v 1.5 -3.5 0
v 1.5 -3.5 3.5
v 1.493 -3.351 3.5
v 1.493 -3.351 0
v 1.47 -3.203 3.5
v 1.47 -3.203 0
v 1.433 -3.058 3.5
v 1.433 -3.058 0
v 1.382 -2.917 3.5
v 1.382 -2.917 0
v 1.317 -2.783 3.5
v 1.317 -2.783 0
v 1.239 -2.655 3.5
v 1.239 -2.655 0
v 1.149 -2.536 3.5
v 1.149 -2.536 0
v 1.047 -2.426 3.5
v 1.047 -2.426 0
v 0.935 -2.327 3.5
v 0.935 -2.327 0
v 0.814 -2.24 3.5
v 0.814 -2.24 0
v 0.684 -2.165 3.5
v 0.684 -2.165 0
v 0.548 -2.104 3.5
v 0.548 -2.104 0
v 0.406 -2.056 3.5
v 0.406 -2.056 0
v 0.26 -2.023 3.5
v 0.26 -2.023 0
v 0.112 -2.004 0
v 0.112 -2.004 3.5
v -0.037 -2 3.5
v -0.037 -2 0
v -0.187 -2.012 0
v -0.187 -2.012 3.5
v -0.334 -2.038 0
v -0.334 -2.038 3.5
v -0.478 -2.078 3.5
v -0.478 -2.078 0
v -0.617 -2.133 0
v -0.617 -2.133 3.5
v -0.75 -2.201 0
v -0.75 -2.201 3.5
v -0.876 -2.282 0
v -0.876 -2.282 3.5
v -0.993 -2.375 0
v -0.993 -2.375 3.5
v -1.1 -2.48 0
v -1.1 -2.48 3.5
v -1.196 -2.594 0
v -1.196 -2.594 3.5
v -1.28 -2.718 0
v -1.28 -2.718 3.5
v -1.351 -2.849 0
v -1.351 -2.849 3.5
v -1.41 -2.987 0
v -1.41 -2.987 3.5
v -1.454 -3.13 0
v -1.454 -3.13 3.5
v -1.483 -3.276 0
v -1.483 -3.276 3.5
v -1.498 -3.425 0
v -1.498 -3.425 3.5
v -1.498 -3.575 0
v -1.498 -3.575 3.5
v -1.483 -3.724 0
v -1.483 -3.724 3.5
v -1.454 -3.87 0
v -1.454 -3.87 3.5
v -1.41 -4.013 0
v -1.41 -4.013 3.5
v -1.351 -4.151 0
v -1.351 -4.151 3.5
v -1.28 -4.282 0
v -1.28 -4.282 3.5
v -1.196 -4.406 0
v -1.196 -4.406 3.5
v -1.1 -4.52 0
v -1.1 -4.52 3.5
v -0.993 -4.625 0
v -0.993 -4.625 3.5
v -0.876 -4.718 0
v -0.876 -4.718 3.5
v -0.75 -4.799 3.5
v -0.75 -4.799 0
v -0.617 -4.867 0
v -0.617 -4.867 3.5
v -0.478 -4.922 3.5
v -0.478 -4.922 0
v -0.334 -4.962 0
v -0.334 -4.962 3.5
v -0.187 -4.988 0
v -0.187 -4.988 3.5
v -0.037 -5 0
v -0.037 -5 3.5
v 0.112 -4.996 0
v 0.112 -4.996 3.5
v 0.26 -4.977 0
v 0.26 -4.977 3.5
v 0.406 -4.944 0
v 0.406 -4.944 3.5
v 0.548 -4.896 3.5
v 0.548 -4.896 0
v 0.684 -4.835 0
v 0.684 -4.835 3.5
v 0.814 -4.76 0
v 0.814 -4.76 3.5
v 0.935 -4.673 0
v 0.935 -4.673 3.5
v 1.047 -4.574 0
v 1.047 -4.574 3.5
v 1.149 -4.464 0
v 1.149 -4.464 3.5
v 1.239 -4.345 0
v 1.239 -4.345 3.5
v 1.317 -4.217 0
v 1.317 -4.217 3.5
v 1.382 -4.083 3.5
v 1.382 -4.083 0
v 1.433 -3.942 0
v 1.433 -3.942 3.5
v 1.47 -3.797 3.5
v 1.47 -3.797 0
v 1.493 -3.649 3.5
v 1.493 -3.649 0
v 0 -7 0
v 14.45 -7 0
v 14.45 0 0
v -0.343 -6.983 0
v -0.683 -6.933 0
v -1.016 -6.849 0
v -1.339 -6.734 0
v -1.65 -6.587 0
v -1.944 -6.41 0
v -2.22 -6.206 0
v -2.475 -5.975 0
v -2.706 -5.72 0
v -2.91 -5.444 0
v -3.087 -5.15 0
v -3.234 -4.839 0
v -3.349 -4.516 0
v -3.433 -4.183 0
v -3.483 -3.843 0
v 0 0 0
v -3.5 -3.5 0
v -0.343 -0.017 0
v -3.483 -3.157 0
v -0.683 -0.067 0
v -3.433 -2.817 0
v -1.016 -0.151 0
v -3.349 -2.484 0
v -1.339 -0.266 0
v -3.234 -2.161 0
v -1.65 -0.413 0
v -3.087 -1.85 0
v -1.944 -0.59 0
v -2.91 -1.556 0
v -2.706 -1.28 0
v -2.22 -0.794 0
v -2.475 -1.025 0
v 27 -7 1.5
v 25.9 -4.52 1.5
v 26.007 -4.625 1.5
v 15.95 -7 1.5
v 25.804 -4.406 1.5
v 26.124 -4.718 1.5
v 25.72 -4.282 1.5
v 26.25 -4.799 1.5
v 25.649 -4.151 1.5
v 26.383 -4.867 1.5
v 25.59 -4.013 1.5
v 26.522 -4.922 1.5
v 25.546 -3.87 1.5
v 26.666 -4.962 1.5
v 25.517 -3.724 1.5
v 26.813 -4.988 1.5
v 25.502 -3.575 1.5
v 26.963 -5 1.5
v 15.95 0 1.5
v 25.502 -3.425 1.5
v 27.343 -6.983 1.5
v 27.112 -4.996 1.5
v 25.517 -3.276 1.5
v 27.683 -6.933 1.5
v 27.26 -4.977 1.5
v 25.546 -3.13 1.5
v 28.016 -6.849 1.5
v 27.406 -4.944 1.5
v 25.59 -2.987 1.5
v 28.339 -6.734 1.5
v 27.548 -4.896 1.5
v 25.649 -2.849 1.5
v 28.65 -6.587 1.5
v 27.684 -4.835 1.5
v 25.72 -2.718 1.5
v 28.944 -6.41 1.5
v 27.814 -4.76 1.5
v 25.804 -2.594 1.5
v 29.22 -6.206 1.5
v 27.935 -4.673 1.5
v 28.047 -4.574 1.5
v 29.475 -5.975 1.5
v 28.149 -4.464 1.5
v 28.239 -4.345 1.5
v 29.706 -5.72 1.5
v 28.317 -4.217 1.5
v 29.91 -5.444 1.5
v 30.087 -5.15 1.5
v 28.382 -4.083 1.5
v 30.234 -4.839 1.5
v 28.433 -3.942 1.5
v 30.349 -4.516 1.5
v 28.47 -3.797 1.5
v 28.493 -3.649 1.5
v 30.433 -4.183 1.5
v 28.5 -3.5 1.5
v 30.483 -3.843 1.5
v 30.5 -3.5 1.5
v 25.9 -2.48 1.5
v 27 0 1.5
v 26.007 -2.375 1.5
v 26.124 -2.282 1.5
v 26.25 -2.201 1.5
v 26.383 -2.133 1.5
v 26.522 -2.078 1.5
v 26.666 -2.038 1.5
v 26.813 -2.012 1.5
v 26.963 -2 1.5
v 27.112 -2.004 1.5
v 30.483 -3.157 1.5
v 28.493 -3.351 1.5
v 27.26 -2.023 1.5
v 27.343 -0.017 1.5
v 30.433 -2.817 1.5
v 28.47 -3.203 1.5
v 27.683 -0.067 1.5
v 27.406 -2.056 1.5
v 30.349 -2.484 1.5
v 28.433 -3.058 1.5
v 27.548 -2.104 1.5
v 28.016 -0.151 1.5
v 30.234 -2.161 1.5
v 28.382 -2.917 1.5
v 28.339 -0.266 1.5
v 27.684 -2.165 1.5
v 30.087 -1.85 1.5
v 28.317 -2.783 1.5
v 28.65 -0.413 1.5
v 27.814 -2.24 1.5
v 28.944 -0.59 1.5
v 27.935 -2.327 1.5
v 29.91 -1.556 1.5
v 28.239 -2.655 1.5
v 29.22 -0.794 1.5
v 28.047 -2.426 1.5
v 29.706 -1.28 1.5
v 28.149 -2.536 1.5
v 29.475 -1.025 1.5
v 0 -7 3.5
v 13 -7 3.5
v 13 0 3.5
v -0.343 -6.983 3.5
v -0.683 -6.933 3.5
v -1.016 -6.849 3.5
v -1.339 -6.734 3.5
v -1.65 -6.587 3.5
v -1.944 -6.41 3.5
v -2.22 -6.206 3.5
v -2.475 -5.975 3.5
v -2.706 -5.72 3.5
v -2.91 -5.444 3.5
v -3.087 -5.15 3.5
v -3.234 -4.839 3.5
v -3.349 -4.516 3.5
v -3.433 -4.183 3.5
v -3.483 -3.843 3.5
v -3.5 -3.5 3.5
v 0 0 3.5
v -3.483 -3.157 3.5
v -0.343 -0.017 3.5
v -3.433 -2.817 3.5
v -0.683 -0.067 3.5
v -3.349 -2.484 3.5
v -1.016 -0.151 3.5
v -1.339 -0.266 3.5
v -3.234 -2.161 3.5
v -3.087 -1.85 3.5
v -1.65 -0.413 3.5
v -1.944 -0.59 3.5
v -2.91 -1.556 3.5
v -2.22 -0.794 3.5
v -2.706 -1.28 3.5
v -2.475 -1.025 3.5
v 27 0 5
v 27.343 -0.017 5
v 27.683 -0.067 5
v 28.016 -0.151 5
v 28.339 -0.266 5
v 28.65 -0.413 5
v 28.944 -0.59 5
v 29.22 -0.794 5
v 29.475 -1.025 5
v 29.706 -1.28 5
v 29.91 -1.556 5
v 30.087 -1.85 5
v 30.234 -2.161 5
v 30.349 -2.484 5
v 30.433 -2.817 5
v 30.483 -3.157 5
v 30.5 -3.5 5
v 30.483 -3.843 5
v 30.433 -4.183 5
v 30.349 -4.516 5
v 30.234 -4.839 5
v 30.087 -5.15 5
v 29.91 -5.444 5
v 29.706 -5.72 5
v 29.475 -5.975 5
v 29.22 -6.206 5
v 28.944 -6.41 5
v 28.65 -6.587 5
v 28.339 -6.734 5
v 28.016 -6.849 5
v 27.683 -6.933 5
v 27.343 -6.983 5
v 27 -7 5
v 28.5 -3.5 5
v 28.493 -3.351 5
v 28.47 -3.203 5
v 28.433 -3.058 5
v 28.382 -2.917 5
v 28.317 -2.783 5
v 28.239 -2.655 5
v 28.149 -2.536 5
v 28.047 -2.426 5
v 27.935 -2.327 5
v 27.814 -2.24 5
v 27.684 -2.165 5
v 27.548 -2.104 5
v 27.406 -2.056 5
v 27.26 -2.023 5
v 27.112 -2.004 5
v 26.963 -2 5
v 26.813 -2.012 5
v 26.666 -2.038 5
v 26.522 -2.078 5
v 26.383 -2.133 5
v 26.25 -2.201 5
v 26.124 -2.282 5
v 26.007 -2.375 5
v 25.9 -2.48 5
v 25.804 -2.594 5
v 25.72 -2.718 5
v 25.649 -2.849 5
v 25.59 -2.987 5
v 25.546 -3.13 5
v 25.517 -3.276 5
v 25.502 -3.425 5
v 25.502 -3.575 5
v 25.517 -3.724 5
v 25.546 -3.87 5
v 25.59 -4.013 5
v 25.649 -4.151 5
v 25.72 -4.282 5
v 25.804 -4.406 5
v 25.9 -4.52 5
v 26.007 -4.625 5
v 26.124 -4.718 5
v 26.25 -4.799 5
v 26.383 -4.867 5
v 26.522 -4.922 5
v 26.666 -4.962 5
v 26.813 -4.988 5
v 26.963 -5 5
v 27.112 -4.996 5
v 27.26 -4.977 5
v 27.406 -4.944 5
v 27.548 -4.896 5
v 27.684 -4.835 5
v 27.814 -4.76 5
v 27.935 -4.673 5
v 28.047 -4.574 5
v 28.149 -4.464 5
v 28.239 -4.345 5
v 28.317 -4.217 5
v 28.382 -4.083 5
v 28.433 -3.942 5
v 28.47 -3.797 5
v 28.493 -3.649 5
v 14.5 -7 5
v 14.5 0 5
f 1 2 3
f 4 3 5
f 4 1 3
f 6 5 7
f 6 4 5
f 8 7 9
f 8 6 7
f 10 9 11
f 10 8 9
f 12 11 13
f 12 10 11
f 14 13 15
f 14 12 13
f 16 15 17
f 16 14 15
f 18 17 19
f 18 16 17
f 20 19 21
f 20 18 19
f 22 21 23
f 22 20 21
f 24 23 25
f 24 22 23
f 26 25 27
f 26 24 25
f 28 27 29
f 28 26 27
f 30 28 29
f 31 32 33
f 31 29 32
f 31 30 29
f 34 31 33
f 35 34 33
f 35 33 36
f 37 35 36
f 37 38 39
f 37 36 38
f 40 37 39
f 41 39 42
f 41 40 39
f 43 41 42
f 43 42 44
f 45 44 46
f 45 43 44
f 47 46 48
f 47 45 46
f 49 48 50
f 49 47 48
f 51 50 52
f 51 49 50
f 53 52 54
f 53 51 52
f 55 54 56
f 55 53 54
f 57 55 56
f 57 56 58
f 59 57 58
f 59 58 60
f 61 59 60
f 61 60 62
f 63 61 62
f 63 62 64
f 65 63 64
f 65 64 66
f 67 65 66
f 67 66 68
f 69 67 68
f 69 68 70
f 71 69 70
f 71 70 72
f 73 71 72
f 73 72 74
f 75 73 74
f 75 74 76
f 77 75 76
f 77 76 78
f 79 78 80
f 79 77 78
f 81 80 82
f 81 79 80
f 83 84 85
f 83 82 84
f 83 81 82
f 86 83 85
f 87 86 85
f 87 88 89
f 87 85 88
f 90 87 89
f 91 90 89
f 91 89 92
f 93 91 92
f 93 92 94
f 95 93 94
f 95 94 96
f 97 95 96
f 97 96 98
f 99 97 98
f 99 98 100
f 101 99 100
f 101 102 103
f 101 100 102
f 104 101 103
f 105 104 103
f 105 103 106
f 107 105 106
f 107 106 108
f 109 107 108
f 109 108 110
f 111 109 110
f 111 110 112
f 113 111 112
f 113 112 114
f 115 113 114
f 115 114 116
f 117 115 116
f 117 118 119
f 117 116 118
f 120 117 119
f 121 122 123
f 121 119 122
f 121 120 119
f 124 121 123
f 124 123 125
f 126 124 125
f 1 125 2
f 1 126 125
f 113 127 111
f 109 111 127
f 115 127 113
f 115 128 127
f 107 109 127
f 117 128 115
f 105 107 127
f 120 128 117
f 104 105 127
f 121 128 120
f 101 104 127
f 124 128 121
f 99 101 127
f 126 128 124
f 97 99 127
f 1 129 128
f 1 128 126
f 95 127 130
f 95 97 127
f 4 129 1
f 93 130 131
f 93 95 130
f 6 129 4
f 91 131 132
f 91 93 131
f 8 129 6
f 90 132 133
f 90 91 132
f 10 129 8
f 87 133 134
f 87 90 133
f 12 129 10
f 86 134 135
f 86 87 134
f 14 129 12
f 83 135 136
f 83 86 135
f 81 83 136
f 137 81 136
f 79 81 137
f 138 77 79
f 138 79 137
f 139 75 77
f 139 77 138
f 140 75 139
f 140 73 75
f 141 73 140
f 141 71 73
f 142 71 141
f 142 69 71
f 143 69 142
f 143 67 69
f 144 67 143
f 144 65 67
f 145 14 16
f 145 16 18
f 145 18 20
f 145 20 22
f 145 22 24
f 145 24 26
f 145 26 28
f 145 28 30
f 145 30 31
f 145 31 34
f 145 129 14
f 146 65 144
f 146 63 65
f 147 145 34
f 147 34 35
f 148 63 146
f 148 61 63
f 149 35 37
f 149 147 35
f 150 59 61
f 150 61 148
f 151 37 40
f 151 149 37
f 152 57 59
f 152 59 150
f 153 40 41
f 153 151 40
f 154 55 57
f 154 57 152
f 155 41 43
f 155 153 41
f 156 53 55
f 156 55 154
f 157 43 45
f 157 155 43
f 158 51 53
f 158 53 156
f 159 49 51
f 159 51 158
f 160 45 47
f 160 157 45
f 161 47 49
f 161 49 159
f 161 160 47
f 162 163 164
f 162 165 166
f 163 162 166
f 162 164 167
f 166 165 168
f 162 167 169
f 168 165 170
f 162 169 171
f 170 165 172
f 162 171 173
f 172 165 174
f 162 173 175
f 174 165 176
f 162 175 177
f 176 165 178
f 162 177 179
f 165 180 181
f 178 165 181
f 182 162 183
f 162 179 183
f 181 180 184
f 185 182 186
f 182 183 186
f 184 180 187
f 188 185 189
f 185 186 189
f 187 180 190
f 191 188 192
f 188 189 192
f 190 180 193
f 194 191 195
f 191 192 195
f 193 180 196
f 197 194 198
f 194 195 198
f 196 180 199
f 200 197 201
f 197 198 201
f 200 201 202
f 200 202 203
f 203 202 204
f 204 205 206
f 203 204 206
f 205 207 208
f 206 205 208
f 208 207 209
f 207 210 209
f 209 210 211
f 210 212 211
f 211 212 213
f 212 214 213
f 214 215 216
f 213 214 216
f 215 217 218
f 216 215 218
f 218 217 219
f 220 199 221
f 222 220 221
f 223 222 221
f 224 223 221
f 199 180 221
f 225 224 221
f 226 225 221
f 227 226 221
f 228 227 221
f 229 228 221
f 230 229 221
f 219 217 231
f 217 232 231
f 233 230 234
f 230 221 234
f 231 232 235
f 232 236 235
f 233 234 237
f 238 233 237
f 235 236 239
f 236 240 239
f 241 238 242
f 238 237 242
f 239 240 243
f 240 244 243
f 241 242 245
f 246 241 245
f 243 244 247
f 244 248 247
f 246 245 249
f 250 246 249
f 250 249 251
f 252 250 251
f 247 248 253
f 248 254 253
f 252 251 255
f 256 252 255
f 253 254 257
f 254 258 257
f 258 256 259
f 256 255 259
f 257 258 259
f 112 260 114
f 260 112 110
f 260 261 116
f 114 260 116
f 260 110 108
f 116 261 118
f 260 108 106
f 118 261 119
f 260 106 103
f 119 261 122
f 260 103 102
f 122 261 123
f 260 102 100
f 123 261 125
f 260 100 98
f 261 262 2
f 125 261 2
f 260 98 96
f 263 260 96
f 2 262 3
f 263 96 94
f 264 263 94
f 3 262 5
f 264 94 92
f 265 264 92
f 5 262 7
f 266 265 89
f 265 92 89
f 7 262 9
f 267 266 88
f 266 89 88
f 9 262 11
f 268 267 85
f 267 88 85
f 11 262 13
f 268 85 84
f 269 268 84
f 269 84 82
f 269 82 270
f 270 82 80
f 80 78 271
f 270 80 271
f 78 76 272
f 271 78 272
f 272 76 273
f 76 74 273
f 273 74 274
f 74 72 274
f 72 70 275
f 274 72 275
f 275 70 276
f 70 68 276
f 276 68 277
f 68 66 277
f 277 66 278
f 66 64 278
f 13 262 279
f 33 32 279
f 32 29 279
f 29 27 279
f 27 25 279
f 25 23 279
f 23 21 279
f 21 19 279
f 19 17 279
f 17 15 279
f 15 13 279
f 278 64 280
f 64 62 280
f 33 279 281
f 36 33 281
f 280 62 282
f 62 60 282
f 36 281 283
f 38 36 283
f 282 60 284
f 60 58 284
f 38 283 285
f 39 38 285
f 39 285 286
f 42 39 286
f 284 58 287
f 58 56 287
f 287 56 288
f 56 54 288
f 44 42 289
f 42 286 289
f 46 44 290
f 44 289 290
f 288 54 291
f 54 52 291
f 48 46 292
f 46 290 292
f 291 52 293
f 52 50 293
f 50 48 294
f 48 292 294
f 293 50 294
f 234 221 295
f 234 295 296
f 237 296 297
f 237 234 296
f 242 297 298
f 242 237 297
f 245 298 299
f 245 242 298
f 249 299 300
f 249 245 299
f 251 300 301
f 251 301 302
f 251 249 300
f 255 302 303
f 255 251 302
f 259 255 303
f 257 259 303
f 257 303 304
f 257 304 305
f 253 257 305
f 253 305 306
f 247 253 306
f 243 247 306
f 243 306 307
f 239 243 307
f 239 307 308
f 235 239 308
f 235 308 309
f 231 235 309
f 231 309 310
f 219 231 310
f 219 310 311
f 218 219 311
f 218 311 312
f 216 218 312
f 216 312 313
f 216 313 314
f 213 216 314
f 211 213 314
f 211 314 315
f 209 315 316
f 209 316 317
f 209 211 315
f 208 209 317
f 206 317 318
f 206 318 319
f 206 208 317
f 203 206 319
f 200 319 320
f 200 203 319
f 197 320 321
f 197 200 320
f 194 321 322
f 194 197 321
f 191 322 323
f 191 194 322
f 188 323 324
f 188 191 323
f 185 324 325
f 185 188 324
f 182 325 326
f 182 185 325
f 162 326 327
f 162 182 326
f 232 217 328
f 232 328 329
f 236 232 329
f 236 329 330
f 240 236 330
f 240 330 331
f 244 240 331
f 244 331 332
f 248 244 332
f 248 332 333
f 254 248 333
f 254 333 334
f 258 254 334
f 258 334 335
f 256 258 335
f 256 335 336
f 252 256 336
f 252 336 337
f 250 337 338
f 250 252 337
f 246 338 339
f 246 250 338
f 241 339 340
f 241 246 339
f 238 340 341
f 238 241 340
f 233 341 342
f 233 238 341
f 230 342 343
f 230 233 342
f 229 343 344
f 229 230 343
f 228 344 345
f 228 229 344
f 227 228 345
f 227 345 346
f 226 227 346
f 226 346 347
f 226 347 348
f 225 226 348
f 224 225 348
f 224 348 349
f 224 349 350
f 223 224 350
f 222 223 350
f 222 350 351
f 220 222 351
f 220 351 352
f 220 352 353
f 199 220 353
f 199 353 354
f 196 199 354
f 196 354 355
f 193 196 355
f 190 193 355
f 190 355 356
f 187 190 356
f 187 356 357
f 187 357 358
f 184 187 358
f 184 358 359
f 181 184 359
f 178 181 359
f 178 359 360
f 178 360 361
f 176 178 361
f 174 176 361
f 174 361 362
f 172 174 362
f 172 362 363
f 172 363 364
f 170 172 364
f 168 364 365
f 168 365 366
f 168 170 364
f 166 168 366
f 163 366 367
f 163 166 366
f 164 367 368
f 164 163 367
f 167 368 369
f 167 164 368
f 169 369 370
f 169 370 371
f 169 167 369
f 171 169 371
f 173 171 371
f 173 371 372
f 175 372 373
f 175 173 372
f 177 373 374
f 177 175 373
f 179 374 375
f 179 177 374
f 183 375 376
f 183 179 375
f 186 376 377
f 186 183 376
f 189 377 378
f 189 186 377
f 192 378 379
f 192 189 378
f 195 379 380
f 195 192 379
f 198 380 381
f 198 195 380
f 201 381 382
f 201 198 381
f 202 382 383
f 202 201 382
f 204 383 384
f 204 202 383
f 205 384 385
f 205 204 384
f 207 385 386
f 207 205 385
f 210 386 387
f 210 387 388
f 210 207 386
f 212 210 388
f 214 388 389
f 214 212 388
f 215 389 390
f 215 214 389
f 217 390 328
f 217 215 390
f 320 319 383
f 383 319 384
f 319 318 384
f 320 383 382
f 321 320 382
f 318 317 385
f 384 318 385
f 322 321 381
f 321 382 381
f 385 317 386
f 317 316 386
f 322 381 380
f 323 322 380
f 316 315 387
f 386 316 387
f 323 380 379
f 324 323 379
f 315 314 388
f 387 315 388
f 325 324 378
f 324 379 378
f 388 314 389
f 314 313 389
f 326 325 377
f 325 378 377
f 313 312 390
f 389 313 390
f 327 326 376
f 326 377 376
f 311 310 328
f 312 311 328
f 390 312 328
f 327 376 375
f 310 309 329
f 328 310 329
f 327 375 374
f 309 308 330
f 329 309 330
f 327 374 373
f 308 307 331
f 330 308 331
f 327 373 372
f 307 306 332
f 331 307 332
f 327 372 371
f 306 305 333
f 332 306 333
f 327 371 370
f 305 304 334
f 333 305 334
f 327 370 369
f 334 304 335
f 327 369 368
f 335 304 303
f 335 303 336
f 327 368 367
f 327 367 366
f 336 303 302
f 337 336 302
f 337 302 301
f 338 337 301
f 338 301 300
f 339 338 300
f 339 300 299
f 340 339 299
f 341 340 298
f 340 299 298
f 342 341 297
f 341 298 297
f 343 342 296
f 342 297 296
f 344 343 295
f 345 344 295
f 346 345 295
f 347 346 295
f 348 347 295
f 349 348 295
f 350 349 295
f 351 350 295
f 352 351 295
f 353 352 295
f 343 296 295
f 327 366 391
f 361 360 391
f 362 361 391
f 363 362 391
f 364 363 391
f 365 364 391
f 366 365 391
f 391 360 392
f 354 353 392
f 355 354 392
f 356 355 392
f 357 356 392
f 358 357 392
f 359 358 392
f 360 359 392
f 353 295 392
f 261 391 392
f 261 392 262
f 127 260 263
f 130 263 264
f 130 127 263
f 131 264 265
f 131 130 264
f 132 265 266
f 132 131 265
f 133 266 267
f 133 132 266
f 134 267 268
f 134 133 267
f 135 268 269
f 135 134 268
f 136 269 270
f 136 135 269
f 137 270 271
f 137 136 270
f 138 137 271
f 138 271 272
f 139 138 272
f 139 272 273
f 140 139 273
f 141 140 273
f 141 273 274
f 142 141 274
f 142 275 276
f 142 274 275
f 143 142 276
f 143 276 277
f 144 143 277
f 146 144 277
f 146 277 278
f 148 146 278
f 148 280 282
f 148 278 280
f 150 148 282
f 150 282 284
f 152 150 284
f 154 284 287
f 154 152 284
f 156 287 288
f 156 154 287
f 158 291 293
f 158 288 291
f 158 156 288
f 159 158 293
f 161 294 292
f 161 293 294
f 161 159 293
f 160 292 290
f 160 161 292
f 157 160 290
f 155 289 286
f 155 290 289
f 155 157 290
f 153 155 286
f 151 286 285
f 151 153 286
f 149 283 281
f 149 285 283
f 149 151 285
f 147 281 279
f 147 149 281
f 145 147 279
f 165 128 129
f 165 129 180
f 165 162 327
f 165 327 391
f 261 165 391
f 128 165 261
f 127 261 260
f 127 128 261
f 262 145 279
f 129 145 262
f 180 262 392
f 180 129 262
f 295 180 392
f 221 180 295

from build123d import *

# Parameters (mm, degrees)
SKETCH1_R           = 1.5
BOSS_EXTRUDE1_DEPTH = 5
SKETCH2_W           = 3.5
SKETCH2_H           = 1.5
CUT_EXTRUDE1_DEPTH  = 32.689903755


with BuildPart() as part:
    # Sketch1 → Boss-Extrude1 (new body)
    with BuildSketch(Plane.XY):
        with BuildLine():
            Line((0, 0), (27, 0))
            ThreePointArc((27, 0), (30.5, -3.5), (27, -7))
            Line((27, -7), (0, -7))
            ThreePointArc((0, -7), (-3.5, -3.5), (0, 0))
        make_face()
        with Locations((0, -3.5)):
            Circle(SKETCH1_R, mode=Mode.SUBTRACT)
        with Locations((27, -3.5)):
            Circle(SKETCH1_R, mode=Mode.SUBTRACT)
    extrude(amount=BOSS_EXTRUDE1_DEPTH)

    # Sketch2 → Cut-Extrude1 (cut, through all)
    with BuildSketch(Plane(origin=(0, 0, 0), x_dir=(1, 0, 0), z_dir=(0, 1, 0))):
        Polygon((0, -5), (14.5, -5), (13, -3.5), (0, -3.5), align=None)
        Polygon((15.949747468, -1.5), (27, -1.5), (27, 0), (14.449747468, 0), align=None)
        with Locations((-1.75, -4.25)):
            Rectangle(SKETCH2_W, SKETCH2_H)
        with Locations((28.75, -0.75)):
            Rectangle(SKETCH2_W, SKETCH2_H)
    extrude(amount=-CUT_EXTRUDE1_DEPTH, mode=Mode.SUBTRACT)


solid = part.part
